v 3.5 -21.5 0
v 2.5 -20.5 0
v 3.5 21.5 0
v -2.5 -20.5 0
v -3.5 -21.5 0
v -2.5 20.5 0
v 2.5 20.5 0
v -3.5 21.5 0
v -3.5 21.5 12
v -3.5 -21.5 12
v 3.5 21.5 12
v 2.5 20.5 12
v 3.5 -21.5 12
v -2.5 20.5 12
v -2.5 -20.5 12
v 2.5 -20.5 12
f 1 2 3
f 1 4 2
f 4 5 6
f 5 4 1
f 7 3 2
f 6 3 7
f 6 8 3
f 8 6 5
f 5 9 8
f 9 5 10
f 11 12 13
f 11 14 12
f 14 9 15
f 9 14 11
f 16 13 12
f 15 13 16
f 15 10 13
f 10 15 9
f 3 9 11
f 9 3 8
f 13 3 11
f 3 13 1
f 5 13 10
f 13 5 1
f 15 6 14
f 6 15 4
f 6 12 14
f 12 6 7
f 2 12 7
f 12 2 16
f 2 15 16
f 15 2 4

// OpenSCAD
// Customizable Belt Loop v1.0 by EKOBEAN


//Menu Area Cor Customizer
//Inside Width
Hole_Width = 5; // [3:15]
//Inside Length
Hole_Lenght = 41; // [15:60]
//Width
Width = 12; // [5:35]
//Loop Thickness
Thickness = 2; // [2:6]

//Script for Belt Loop !
difference() { 
 linear_extrude(height = Width)
 square([Hole_Width+Thickness,Hole_Lenght+Thickness], center=true); //outside
 linear_extrude(height = Width)
 square([Hole_Width,Hole_Lenght], center=true); //hole
}
